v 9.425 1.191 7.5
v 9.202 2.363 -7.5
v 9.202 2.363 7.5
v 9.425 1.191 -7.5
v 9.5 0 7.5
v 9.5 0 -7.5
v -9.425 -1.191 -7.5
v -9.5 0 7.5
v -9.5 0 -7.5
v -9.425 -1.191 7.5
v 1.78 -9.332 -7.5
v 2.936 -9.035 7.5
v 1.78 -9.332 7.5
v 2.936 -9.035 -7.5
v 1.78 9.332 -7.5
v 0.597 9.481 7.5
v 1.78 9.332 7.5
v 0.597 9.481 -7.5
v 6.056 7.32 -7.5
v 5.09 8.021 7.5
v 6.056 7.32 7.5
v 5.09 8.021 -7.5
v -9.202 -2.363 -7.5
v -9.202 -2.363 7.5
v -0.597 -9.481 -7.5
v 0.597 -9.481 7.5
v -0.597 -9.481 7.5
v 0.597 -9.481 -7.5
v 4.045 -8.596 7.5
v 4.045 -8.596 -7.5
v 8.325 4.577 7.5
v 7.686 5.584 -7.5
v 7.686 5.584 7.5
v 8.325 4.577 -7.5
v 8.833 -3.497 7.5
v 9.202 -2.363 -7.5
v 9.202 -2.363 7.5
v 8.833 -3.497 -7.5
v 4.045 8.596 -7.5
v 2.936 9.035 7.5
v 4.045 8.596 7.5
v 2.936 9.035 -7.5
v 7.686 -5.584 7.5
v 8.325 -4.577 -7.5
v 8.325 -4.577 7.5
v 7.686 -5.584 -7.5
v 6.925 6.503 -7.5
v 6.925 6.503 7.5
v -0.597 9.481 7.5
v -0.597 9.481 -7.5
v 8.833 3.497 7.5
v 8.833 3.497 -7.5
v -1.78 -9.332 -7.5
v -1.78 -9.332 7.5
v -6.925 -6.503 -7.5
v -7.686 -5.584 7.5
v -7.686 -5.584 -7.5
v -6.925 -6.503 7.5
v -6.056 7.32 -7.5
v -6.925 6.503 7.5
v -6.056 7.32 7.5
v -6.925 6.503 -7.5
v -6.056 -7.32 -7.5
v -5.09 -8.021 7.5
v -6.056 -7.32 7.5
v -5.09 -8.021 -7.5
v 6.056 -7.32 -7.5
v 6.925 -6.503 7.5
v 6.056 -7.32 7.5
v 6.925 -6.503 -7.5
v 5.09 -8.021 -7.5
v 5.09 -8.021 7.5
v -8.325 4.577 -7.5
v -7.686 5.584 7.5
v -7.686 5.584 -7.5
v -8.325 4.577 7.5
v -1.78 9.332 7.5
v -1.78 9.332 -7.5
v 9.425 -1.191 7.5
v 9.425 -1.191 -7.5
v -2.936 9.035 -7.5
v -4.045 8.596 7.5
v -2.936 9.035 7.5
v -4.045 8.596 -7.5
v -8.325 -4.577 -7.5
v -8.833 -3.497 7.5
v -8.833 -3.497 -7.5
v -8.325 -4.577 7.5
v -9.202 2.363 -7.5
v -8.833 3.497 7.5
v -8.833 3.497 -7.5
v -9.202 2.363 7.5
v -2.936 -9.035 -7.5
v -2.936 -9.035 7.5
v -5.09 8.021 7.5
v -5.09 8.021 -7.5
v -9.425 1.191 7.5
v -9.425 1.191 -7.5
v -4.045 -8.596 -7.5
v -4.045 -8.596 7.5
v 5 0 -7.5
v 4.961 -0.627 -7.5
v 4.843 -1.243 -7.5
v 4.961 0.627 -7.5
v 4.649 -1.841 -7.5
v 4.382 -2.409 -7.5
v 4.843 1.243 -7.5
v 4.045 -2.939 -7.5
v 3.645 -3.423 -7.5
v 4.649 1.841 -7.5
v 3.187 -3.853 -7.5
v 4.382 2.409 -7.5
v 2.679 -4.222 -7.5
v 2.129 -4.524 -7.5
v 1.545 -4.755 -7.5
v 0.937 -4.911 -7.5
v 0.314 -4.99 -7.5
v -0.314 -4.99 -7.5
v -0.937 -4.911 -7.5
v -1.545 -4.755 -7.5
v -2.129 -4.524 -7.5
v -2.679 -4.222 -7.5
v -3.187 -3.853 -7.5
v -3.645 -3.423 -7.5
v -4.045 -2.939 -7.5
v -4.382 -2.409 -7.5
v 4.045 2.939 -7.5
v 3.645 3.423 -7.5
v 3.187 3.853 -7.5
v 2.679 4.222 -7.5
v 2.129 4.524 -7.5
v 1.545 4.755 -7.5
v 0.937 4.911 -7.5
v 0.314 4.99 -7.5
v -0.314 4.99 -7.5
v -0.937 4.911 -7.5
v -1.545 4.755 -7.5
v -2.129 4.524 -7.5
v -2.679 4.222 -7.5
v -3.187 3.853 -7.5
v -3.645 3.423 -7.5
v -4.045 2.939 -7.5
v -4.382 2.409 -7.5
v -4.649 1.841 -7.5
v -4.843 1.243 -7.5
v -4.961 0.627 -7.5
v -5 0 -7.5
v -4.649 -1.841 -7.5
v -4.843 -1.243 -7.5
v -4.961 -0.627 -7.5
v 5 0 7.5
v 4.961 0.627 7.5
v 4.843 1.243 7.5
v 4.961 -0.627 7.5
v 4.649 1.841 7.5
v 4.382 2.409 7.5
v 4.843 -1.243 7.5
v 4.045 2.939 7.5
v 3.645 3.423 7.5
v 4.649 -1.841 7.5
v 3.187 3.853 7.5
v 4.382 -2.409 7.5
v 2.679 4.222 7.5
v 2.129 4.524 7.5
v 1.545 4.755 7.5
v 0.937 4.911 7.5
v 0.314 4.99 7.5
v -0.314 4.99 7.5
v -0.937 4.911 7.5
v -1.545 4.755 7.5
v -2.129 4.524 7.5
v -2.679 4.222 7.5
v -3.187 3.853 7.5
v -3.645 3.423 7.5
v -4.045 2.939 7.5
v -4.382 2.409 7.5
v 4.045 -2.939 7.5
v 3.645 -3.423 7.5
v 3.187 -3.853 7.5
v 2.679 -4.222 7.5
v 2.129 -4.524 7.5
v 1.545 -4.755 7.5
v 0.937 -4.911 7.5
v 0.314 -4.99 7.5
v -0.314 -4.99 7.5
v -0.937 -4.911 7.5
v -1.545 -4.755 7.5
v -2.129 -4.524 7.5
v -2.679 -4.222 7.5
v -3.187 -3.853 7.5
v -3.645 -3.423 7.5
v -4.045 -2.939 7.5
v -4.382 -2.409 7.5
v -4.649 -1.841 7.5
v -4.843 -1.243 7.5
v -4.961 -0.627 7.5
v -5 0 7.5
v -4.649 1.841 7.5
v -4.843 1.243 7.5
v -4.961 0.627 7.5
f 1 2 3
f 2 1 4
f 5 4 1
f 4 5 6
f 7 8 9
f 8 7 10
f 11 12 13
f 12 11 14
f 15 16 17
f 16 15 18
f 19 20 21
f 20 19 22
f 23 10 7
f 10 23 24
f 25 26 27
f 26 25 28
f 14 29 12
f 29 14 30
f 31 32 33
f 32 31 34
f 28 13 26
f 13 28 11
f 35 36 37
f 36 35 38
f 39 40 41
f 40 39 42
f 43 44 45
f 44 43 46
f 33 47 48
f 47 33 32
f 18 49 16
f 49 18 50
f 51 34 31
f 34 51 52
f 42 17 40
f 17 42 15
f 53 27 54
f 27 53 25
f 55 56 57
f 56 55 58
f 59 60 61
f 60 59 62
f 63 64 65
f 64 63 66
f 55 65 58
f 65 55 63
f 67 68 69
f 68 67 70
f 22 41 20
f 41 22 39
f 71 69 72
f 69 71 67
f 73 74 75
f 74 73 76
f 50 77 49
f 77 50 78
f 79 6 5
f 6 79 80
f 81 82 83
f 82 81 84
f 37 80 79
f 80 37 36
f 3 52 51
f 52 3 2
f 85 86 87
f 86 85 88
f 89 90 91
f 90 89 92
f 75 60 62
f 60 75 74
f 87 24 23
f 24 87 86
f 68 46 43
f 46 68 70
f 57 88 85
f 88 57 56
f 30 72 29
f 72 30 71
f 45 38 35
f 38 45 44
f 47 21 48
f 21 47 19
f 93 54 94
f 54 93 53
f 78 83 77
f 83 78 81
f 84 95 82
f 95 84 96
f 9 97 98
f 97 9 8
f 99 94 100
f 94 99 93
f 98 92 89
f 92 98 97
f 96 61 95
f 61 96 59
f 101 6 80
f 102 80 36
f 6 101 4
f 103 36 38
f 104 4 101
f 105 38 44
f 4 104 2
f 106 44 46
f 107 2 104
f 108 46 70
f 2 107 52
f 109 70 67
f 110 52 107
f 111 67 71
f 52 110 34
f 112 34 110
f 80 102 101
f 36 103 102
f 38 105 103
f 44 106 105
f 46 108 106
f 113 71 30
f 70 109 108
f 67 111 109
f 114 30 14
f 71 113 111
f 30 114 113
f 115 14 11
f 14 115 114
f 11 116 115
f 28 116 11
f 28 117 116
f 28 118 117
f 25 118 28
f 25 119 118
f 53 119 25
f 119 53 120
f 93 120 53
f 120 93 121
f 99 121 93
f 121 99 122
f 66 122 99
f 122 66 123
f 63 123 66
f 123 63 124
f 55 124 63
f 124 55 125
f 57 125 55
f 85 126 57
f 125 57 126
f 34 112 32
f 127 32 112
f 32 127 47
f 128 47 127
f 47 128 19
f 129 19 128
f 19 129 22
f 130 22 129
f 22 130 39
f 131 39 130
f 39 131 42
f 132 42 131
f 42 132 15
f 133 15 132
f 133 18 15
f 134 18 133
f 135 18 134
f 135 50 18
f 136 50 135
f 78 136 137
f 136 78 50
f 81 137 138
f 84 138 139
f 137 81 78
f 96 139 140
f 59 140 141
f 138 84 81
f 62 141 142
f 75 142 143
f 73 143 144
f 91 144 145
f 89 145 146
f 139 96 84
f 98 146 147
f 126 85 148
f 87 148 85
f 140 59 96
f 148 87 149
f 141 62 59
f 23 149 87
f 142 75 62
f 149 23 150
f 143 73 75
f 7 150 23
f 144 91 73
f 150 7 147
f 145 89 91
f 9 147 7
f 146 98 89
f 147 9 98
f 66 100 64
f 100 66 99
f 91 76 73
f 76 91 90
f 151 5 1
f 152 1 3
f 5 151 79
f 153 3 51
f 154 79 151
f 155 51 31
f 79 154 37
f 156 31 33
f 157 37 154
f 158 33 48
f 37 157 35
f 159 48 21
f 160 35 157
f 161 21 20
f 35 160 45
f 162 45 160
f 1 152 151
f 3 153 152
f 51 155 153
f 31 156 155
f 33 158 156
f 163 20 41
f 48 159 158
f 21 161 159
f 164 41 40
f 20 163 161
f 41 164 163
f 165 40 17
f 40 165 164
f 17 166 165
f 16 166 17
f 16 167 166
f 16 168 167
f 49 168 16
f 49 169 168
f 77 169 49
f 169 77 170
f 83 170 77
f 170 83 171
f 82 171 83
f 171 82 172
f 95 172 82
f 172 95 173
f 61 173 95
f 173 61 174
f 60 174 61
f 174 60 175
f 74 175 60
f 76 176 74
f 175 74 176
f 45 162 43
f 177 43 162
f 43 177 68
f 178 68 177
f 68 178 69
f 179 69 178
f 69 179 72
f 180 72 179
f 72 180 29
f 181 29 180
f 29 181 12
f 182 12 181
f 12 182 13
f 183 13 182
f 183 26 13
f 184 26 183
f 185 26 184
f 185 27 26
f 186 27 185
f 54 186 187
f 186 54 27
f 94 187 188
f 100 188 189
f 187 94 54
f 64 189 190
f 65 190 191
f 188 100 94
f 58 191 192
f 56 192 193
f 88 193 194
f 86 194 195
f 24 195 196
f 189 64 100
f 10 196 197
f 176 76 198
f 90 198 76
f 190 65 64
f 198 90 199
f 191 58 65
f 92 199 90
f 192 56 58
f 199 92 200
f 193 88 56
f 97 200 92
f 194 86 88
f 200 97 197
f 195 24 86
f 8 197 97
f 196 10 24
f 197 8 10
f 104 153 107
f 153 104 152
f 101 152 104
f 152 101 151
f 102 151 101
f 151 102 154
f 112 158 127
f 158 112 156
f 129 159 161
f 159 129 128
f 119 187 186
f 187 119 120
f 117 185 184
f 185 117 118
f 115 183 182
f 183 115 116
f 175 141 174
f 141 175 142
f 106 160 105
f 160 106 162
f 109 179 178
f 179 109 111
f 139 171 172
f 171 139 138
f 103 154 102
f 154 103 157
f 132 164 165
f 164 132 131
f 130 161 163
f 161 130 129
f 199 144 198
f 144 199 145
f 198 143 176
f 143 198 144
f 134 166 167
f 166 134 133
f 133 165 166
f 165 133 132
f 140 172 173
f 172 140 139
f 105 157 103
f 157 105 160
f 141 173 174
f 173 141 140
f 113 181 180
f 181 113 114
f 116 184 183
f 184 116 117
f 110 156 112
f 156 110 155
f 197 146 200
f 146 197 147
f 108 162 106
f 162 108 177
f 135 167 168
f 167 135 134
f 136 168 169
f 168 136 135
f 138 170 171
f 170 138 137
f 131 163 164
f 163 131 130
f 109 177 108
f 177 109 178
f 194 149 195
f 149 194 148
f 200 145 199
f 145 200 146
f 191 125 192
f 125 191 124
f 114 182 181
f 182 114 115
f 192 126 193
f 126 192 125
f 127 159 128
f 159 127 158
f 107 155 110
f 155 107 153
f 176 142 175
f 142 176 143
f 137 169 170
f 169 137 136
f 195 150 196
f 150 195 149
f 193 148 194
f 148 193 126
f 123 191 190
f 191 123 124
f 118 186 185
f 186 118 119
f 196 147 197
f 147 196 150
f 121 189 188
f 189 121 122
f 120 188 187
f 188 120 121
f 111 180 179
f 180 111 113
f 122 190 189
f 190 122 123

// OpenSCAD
$fn = 50;


difference() {
	union() {
		translate(v = [0, 0, -7.5000000000]) {
			cylinder(h = 15, r = 9.5000000000);
		}
	}
	union() {
		translate(v = [0, 0, -100.0000000000]) {
			cylinder(h = 200, r = 5.0000000000);
		}
	}
}
